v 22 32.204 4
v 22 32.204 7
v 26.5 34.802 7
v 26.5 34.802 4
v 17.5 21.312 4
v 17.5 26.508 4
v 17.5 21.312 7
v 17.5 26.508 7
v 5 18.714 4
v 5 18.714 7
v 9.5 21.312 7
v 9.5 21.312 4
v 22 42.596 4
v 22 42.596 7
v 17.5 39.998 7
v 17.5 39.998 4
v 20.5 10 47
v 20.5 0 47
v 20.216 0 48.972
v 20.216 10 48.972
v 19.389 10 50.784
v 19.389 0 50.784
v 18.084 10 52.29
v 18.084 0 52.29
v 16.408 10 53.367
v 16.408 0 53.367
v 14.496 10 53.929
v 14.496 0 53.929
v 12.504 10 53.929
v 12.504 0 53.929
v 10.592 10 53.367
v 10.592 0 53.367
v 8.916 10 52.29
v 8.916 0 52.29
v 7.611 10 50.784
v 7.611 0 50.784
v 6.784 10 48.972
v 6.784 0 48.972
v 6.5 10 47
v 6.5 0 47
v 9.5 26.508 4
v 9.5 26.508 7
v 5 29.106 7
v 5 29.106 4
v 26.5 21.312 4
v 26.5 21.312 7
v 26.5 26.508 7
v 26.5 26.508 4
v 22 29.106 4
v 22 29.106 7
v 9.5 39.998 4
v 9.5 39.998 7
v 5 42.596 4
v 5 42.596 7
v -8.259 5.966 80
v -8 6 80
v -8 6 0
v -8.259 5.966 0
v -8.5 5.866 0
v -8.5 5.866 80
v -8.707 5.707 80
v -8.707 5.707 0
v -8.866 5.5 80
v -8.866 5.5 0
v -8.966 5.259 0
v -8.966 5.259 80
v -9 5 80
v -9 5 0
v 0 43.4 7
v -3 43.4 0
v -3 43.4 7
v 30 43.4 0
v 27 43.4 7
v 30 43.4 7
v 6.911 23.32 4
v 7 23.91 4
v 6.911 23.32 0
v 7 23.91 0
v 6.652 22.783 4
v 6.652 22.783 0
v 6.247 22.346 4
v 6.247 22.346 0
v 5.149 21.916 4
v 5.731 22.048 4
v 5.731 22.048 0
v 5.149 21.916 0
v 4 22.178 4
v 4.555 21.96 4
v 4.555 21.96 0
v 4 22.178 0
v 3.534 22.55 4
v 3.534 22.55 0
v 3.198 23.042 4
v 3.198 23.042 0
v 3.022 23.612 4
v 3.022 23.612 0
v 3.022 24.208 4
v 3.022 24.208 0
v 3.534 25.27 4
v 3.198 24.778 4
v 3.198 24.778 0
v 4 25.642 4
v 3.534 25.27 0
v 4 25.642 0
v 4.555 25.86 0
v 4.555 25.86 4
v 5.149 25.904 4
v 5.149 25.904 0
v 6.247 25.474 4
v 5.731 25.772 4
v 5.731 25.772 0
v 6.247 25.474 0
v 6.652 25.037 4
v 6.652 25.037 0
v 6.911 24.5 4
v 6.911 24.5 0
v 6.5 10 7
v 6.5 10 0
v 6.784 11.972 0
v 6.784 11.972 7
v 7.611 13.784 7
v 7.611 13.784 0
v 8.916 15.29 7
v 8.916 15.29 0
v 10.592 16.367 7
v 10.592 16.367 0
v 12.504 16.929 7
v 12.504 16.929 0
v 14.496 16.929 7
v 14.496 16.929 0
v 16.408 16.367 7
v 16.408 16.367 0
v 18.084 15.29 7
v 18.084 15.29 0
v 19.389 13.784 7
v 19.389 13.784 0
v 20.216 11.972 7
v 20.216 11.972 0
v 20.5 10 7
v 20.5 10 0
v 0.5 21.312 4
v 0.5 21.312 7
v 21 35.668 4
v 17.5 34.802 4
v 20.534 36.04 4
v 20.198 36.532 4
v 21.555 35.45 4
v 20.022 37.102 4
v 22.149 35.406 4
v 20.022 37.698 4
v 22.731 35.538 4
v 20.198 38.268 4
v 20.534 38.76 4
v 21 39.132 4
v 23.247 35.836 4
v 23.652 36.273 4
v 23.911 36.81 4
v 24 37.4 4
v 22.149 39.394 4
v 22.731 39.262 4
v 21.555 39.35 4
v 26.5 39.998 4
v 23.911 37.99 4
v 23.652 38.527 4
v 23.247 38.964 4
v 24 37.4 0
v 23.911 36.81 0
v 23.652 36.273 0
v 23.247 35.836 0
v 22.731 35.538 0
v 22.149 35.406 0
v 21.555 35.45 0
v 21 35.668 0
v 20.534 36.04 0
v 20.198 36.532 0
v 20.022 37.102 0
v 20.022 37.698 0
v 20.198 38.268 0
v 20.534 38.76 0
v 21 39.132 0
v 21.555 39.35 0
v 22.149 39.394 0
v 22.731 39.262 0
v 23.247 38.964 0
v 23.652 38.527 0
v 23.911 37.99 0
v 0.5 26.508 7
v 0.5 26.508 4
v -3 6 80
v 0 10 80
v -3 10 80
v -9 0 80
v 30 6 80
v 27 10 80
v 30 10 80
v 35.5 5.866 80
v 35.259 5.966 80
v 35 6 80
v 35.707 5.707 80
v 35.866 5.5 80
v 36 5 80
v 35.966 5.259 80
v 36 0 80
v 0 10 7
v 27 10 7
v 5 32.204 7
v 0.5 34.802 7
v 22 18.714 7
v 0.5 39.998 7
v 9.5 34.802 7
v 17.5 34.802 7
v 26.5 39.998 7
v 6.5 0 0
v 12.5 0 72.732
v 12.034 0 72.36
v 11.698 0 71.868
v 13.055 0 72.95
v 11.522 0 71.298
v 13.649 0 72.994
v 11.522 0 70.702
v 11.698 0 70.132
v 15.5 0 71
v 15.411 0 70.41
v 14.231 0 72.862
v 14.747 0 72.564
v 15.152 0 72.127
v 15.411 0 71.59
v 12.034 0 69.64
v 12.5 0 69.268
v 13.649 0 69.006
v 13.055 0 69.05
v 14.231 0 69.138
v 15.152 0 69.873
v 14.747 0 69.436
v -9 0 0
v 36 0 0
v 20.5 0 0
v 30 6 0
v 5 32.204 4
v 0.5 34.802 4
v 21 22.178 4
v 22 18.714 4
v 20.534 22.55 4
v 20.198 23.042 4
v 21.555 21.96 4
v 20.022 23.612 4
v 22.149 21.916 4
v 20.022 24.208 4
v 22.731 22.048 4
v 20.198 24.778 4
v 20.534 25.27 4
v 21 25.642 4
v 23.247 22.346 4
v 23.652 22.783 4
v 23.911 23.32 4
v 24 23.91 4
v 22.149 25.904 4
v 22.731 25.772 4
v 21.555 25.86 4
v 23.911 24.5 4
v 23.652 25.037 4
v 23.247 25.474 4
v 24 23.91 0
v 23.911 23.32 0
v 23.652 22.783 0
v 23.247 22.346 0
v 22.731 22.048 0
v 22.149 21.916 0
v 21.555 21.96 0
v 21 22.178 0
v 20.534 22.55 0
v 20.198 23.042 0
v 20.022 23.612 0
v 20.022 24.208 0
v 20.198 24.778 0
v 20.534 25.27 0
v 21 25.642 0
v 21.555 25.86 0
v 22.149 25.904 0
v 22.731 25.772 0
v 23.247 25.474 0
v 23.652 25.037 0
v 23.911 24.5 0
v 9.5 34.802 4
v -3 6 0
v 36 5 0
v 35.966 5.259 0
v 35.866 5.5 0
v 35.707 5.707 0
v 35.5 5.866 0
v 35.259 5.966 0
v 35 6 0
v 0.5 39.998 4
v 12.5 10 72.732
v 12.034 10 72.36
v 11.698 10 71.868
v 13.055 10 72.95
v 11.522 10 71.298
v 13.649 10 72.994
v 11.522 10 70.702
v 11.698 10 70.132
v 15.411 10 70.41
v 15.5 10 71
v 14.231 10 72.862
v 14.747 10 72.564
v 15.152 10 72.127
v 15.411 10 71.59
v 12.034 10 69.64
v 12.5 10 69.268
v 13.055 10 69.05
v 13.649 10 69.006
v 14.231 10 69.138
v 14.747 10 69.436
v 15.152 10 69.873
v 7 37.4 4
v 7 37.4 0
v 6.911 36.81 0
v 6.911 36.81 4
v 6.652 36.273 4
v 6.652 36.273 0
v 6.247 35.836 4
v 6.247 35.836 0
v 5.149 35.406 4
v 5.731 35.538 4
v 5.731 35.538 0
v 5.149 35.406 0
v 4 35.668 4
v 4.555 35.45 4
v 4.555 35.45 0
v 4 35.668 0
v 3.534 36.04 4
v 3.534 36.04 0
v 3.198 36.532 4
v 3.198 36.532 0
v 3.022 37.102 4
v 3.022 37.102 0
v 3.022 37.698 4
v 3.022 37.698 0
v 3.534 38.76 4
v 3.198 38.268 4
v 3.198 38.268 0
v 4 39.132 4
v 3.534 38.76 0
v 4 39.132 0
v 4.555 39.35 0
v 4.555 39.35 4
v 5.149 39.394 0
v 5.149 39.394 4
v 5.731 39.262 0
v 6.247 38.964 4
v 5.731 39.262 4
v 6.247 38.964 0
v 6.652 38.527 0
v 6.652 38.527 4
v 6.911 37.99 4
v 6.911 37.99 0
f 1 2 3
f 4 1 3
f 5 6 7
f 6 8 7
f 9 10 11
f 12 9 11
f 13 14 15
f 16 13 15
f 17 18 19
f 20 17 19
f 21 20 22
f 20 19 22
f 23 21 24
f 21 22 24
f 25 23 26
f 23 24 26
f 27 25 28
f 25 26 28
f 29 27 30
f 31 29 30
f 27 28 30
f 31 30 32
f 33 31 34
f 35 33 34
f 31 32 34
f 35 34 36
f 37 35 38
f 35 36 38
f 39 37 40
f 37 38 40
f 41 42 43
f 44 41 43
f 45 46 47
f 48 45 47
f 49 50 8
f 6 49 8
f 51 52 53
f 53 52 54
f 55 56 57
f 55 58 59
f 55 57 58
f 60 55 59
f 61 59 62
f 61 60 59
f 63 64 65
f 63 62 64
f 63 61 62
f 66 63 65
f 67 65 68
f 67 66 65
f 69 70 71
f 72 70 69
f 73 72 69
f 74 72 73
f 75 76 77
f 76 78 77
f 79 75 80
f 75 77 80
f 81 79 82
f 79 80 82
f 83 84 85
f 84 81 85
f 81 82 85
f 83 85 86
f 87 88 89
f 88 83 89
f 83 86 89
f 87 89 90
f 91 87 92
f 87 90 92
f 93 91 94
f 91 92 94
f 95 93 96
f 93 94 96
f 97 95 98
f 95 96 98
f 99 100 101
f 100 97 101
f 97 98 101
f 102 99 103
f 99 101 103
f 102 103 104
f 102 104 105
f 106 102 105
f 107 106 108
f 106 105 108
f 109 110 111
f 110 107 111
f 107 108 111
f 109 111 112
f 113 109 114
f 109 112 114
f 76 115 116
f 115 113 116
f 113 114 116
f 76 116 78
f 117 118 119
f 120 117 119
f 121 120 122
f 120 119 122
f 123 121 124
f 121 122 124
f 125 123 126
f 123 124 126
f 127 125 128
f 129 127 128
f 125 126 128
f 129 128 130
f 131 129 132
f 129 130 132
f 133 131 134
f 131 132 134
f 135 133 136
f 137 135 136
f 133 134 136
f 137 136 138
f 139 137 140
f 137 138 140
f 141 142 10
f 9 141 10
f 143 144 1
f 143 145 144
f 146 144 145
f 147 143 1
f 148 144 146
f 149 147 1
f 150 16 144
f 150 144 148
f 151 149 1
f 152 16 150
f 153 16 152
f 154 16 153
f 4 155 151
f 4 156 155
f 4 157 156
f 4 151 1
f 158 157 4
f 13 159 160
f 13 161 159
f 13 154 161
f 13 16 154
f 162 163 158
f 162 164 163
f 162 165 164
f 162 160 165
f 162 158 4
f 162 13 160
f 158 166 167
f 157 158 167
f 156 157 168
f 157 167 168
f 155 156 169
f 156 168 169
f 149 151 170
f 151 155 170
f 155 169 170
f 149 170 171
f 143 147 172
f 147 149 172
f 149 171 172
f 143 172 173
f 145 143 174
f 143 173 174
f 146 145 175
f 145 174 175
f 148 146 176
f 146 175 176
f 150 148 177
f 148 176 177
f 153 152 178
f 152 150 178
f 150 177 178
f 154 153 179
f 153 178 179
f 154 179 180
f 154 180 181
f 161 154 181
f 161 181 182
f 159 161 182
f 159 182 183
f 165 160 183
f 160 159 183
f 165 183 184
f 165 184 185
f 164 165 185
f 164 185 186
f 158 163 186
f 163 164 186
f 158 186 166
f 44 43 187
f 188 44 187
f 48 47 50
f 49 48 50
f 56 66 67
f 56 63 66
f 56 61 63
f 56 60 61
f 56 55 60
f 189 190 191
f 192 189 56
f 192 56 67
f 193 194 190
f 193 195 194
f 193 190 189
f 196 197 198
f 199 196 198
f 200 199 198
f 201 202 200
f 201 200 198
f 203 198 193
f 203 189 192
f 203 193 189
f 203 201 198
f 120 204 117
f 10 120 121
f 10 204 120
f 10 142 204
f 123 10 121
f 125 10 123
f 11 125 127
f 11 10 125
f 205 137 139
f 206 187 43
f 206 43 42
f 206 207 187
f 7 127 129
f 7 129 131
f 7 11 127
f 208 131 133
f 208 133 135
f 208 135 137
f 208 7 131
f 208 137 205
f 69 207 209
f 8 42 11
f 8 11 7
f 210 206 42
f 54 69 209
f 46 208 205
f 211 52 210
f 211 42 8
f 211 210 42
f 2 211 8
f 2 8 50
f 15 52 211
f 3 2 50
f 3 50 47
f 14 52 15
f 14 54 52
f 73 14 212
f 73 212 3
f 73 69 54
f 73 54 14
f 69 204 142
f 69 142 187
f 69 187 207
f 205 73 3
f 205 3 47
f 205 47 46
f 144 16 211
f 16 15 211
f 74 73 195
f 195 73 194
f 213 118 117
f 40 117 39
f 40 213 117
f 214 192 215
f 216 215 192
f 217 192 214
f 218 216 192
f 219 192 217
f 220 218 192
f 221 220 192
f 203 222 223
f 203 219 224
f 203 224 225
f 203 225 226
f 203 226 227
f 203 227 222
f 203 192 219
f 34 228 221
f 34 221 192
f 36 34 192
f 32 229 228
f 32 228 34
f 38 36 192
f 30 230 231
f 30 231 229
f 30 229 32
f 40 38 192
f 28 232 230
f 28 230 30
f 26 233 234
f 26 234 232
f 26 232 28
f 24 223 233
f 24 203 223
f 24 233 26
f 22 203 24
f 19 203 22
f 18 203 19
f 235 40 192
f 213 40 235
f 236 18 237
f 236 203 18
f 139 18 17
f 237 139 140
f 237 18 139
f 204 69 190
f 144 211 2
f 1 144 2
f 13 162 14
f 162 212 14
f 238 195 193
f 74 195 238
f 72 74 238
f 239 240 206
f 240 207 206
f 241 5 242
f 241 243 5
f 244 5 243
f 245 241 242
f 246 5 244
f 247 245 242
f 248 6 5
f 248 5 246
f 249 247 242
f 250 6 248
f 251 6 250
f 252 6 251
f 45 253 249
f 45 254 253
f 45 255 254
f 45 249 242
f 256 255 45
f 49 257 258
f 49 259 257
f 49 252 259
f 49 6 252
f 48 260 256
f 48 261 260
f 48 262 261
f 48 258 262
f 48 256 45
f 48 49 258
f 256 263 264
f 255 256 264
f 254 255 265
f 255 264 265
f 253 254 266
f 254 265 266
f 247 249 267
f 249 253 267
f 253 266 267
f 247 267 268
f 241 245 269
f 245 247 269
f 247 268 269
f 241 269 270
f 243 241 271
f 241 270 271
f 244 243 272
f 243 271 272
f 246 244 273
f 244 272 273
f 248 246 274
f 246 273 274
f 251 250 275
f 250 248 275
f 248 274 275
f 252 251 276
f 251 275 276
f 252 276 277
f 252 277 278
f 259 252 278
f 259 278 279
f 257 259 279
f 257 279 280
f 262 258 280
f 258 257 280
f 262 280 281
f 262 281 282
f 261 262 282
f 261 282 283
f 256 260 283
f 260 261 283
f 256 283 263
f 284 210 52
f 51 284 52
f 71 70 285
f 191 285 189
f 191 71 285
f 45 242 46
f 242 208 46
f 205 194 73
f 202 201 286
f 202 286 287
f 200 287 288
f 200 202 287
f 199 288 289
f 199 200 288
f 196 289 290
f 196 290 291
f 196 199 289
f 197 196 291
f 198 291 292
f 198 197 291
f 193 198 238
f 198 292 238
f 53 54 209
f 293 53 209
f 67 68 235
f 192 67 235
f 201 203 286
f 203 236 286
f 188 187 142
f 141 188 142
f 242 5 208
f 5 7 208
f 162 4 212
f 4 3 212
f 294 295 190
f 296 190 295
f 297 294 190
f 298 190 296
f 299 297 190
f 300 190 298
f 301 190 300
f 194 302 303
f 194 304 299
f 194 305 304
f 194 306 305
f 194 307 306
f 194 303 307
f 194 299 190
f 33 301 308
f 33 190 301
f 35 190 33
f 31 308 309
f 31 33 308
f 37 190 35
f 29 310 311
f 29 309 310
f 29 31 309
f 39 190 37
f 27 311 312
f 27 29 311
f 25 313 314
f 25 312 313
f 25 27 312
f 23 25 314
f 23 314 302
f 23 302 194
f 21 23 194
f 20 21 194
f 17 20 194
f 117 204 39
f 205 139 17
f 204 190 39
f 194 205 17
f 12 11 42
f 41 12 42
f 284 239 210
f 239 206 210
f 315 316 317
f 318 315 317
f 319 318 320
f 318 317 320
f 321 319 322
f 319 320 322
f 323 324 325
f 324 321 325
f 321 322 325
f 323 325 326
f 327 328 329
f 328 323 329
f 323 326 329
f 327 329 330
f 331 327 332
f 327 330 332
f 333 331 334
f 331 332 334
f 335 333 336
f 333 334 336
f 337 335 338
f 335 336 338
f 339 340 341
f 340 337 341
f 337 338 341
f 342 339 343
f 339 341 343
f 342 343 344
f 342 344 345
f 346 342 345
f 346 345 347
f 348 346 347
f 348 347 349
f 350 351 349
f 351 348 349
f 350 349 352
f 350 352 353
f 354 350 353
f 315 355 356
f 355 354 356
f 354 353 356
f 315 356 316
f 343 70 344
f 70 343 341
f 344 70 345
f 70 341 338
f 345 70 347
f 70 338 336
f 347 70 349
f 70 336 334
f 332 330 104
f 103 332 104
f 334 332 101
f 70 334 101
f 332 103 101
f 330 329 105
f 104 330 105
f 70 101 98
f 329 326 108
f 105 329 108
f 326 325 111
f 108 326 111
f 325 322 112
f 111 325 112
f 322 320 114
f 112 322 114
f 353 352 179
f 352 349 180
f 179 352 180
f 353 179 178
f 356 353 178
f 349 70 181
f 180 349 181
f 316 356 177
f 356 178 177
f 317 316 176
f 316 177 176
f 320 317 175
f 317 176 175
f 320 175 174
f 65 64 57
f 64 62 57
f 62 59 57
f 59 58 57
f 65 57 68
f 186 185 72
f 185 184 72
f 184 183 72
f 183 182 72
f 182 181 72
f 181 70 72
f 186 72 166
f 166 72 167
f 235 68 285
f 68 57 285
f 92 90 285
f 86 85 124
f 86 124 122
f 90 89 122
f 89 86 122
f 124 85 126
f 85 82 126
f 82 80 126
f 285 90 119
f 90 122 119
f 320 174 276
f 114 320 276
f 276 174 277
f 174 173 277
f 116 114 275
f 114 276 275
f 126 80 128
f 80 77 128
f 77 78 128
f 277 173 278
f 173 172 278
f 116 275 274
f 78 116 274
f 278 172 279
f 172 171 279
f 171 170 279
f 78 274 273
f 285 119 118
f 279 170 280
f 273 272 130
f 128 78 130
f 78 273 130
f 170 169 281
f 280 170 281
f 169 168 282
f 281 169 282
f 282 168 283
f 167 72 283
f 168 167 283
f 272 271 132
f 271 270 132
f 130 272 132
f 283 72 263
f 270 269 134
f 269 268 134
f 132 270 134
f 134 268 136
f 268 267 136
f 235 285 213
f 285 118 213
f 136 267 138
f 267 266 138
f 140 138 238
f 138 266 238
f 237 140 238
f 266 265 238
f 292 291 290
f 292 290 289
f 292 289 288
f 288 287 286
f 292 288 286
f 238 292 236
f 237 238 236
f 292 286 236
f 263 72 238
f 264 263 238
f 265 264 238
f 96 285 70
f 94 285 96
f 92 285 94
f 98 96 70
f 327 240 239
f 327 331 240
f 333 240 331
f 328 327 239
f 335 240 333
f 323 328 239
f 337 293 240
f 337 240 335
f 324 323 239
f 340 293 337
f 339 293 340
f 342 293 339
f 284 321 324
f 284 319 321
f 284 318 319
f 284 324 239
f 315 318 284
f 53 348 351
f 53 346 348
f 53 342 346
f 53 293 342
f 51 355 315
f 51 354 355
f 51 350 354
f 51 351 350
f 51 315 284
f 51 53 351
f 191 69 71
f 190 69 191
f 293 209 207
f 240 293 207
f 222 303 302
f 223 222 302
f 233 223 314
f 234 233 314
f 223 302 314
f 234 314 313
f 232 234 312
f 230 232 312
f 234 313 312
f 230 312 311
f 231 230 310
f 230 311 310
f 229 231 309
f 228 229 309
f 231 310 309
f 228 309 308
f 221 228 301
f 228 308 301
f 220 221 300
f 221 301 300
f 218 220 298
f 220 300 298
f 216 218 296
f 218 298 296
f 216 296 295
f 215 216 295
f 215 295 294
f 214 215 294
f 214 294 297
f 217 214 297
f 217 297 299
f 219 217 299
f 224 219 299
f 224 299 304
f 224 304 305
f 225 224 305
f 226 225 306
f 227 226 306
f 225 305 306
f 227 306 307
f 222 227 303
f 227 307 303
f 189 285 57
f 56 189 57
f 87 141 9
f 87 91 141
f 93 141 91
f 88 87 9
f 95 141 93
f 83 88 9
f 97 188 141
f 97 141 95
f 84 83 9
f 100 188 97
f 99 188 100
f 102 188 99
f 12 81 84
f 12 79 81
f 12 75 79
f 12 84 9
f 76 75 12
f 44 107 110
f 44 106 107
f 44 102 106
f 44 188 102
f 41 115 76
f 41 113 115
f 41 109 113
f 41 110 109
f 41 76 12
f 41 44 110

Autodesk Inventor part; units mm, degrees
ref_plane "YZ Plane" through (0, 0, 0) normal (1, 0, 0) x (0, 1, 0)
ref_plane "XZ Plane" through (0, 0, 0) normal (0, 1, 0) x (-1, 0, 0)
ref_plane "XY Plane" through (0, 0, 0) normal (0, 0, 1) x (1, 0, 0)
sketch "Sketch1" plane through (0, 0, 0) normal (0, 0, 1) x (1, 0, 0)
  line L0 (0, 43.4) -> (27, 43.4)
  line L1 (27, 43.4) -> (27, 0)
  line L2 (27, 0) -> (0, 0)
  line L3 (0, 0) -> (0, 43.4)
  circle A0 centre (5, 37.4) radius 2
  circle A1 centre (22, 37.4) radius 2
  circle A2 centre (5, 23.91) radius 2
  circle A3 centre (22, 23.91) radius 2
  dimension "d0" = 27
  dimension "d1" = 43.4
  dimension "d2" = 4
  dimension "d3" = 6
  dimension "d4" = 6
  dimension "d5" = 5
  dimension "d6" = 5
  dimension "d7" = 5
  dimension "d8" = 5
  dimension "d61" = 13.49
  dimension "d62" = 13.49
extrude "Extrusion1" add sketch "Sketch1" along normal blind 7
sketch "Sketch2" plane through (0, 0, 7) normal (0, 0, 1) x (1, 0, 0)
  line L0 (0, 10) -> (27, 10)
  line L1 (27, 10) -> (27, 0)
  line L2 (27, 0) -> (0, 0)
  line L3 (0, 0) -> (0, 10)
  line L4 (0, 0) -> (27, 0) projected
  line L5 (0, 43.4) -> (0, 0) projected
  line L6 (27, 0) -> (27, 43.4) projected
  dimension "d13" = 10
extrude "Extrusion2" add sketch "Sketch2" along normal blind 73
sketch "Sketch3" plane through (0, 0, 7) normal (0, 0, 1) x (1, 0, 0)
  line L0 (0.5, 39.9981) -> (0.5, 34.8019)
  line L1 (0.5, 34.8019) -> (5, 32.2038)
  line L2 (5, 32.2038) -> (9.5, 34.8019)
  line L3 (9.5, 34.8019) -> (9.5, 39.9981)
  line L4 (9.5, 39.9981) -> (5, 42.5962)
  line L5 (5, 42.5962) -> (0.5, 39.9981)
  circle A0 centre (5, 37.4) radius 4.5
  circle A1 centre (5, 37.4) radius 2 projected
  line L6 (17.5, 39.9981) -> (17.5, 34.8019)
  line L7 (17.5, 34.8019) -> (22, 32.2038)
  line L8 (22, 32.2038) -> (26.5, 34.8019)
  line L9 (26.5, 34.8019) -> (26.5, 39.9981)
  line L10 (26.5, 39.9981) -> (22, 42.5962)
  line L11 (22, 42.5962) -> (17.5, 39.9981)
  circle A2 centre (22, 37.4) radius 4.5
  line L12 (17.5, 26.5081) -> (17.5, 21.3119)
  line L13 (17.5, 21.3119) -> (22, 18.7138)
  line L14 (22, 18.7138) -> (26.5, 21.3119)
  line L15 (26.5, 21.3119) -> (26.5, 26.5081)
  line L16 (26.5, 26.5081) -> (22, 29.1062)
  line L17 (22, 29.1062) -> (17.5, 26.5081)
  circle A3 centre (22, 23.91) radius 4.5
  line L18 (0.5, 26.5081) -> (0.5, 21.3119)
  line L19 (0.5, 21.3119) -> (5, 18.7138)
  line L20 (5, 18.7138) -> (9.5, 21.3119)
  line L21 (9.5, 21.3119) -> (9.5, 26.5081)
  line L22 (9.5, 26.5081) -> (5, 29.1062)
  line L23 (5, 29.1062) -> (0.5, 26.5081)
  circle A4 centre (5, 23.91) radius 4.5
  circle A5 centre (22, 37.4) radius 2 projected
  circle A6 centre (22, 23.91) radius 2 projected
  circle A7 centre (5, 23.91) radius 2 projected
  point P0 (0, 0)
  dimension "d16" = 120
  dimension "d17" = 120
  dimension "d18" = 9
  dimension "d19" = 120
  dimension "d20" = 120
  dimension "d21" = 9
  dimension "d22" = 120
  dimension "d23" = 120
  dimension "d24" = 9
  dimension "d25" = 120
  dimension "d26" = 120
  dimension "d27" = 9
extrude "Extrusion3" cut sketch "Sketch3" against normal blind 3 contours L5 A0 L0 | A0 L1 L0 | A0 | L5 L4 A0 | A0 L2 L1 | L4 L3 A0 | A0 L3 L2 | A1 | L11 A2 L6 | A2 L7 L6 | A2 | L11 L10 A2 | A2 L8 L7 | L10 L9 A2 | A2 L9 L8 | L17 A3 L12 | A3 L13 L12 | A3 | L17 L16 A3 | A3 L14 L13 | L16 L15 A3 | A3 L15 L14 | L23 A4 L18 | A4 L19 L18 | A4 | L23 L22 A4 | A4 L20 L19 | L22 L21 A4 | A4 L21 L20 | A5 | A6 | A7
sketch "Sketch4" plane through (27, 0, 0) normal (1, 0, 0) x (0, 0, -1)
  line L0 (-80, 10) -> (-80, 0) projected
  line L1 (-7, 43.4) -> (-80, 10)
  line L2 (-80, 10) -> (-80, 0)
  line L3 (0, 43.4) -> (0, 0) projected
  line L4 (-80, 0) -> (0, 0)
  line L5 (0, 0) -> (0, 43.4)
  line L6 (0, 43.4) -> (-7, 43.4) projected
  line L7 (0, 43.4) -> (-7, 43.4)
extrude "Extrusion4" add sketch "Sketch4" along normal blind 3
sketch "Sketch5" plane through (0, 0, 0) normal (-1, 0, 0) x (0, 0, 1)
  line L0 (80, 0) -> (0, 0) projected
  line L1 (80, 10) -> (80, 0) projected
  line L2 (80, 0) -> (80, 10)
  line L3 (7, 43.4) -> (80, 10) projected
  line L4 (80, 10) -> (7, 43.4)
  line L5 (0, 43.4) -> (7, 43.4) projected
  line L6 (7, 43.4) -> (0, 43.4)
  line L7 (0, 43.4) -> (0, 0) projected
  line L8 (0, 43.4) -> (0, 0)
  line L9 (0, 0) -> (80, 0)
extrude "Extrusion5" add sketch "Sketch5" along normal blind 3
sketch "Sketch6" plane through (27, 10, 80) normal (0, 1, 0) x (1, 0, 0)
  circle A0 centre (-13.5, 9) radius 2
  line L0 (-27, 0) -> (-27, 73) projected
  line L1 (0, 0) -> (-27, 0) projected
  line L2 (-30, 80) -> (3, 80) projected
  point P0 (-27, 80)
  dimension "d34" = 4
  dimension "d35" = 13.5
  dimension "d45" = 71
extrude "Extrusion6" cut sketch "Sketch6" against normal blind 74
sketch "Sketch7" plane through (30, 0, 0) normal (0, -1, 0) x (1, 0, 0)
  line L0 (-9.5, 47) -> (-9.5, 0)
  line L1 (-9.5, 0) -> (-23.5, 0)
  line L2 (-23.5, 0) -> (-23.5, 47)
  line L3 (0, 80) -> (0, 0) projected
  line L4 (-33, 0) -> (-33, 80) projected
  line L5 (-33, 0) -> (0, 0) projected
  arc A0 (-9.5, 47) -> (-23.5, 47) centre (-16.5, 47) ccw
  point P0 (-30, 0)
  dimension "d39" = 33
  dimension "d40" = 14
  dimension "d41" = 9.5
  dimension "d42" = 47
extrude "Extrusion7" cut sketch "Sketch7" against normal blind 10
sketch "Sketch8" plane through (0, 0, 0) normal (0, 0, -1) x (-1, 0, 0)
  line L0 (-27, 10) -> (0, 10) projected
  circle A0 centre (-13.5, 10) radius 7
  point P0 (0, 0)
  point P1 (-6.5, 10)
  point P2 (-20.5, 10)
extrude "Extrusion8" cut sketch "Sketch8" against normal blind 74 contours A0 L0 picked at (-15.8333, 12.1687)
sketch "Sketch10" plane through (0, 0, 0) normal (0, 0, -1) x (-1, 0, 0)
  line L0 (3, 6) -> (9, 6)
  line L1 (9, 6) -> (9, 0)
  line L2 (9, 0) -> (3, 0)
  line L3 (3, 0) -> (3, 6)
  line L4 (3, 0) -> (-6.5, 0) projected
  line L5 (3, 43.4) -> (3, 0) projected
  line L6 (-36, 6) -> (-30, 6)
  line L7 (-30, 6) -> (-30, 0)
  line L8 (-30, 0) -> (-36, 0)
  line L9 (-36, 0) -> (-36, 6)
  point P0 (0, 0)
  point P1 (-30, 0)
  dimension "d56" = 6
  dimension "d57" = 6
extrude "Extrusion10" add sketch "Sketch10" against normal up to surface (80 mm away)
fillet "Fillet1" radius 1 2 edges at (-9, 6, 40) (36, 6, 40)
properties part number "1322_Clamp Holder_V1" material "Acetal Resin, White"
